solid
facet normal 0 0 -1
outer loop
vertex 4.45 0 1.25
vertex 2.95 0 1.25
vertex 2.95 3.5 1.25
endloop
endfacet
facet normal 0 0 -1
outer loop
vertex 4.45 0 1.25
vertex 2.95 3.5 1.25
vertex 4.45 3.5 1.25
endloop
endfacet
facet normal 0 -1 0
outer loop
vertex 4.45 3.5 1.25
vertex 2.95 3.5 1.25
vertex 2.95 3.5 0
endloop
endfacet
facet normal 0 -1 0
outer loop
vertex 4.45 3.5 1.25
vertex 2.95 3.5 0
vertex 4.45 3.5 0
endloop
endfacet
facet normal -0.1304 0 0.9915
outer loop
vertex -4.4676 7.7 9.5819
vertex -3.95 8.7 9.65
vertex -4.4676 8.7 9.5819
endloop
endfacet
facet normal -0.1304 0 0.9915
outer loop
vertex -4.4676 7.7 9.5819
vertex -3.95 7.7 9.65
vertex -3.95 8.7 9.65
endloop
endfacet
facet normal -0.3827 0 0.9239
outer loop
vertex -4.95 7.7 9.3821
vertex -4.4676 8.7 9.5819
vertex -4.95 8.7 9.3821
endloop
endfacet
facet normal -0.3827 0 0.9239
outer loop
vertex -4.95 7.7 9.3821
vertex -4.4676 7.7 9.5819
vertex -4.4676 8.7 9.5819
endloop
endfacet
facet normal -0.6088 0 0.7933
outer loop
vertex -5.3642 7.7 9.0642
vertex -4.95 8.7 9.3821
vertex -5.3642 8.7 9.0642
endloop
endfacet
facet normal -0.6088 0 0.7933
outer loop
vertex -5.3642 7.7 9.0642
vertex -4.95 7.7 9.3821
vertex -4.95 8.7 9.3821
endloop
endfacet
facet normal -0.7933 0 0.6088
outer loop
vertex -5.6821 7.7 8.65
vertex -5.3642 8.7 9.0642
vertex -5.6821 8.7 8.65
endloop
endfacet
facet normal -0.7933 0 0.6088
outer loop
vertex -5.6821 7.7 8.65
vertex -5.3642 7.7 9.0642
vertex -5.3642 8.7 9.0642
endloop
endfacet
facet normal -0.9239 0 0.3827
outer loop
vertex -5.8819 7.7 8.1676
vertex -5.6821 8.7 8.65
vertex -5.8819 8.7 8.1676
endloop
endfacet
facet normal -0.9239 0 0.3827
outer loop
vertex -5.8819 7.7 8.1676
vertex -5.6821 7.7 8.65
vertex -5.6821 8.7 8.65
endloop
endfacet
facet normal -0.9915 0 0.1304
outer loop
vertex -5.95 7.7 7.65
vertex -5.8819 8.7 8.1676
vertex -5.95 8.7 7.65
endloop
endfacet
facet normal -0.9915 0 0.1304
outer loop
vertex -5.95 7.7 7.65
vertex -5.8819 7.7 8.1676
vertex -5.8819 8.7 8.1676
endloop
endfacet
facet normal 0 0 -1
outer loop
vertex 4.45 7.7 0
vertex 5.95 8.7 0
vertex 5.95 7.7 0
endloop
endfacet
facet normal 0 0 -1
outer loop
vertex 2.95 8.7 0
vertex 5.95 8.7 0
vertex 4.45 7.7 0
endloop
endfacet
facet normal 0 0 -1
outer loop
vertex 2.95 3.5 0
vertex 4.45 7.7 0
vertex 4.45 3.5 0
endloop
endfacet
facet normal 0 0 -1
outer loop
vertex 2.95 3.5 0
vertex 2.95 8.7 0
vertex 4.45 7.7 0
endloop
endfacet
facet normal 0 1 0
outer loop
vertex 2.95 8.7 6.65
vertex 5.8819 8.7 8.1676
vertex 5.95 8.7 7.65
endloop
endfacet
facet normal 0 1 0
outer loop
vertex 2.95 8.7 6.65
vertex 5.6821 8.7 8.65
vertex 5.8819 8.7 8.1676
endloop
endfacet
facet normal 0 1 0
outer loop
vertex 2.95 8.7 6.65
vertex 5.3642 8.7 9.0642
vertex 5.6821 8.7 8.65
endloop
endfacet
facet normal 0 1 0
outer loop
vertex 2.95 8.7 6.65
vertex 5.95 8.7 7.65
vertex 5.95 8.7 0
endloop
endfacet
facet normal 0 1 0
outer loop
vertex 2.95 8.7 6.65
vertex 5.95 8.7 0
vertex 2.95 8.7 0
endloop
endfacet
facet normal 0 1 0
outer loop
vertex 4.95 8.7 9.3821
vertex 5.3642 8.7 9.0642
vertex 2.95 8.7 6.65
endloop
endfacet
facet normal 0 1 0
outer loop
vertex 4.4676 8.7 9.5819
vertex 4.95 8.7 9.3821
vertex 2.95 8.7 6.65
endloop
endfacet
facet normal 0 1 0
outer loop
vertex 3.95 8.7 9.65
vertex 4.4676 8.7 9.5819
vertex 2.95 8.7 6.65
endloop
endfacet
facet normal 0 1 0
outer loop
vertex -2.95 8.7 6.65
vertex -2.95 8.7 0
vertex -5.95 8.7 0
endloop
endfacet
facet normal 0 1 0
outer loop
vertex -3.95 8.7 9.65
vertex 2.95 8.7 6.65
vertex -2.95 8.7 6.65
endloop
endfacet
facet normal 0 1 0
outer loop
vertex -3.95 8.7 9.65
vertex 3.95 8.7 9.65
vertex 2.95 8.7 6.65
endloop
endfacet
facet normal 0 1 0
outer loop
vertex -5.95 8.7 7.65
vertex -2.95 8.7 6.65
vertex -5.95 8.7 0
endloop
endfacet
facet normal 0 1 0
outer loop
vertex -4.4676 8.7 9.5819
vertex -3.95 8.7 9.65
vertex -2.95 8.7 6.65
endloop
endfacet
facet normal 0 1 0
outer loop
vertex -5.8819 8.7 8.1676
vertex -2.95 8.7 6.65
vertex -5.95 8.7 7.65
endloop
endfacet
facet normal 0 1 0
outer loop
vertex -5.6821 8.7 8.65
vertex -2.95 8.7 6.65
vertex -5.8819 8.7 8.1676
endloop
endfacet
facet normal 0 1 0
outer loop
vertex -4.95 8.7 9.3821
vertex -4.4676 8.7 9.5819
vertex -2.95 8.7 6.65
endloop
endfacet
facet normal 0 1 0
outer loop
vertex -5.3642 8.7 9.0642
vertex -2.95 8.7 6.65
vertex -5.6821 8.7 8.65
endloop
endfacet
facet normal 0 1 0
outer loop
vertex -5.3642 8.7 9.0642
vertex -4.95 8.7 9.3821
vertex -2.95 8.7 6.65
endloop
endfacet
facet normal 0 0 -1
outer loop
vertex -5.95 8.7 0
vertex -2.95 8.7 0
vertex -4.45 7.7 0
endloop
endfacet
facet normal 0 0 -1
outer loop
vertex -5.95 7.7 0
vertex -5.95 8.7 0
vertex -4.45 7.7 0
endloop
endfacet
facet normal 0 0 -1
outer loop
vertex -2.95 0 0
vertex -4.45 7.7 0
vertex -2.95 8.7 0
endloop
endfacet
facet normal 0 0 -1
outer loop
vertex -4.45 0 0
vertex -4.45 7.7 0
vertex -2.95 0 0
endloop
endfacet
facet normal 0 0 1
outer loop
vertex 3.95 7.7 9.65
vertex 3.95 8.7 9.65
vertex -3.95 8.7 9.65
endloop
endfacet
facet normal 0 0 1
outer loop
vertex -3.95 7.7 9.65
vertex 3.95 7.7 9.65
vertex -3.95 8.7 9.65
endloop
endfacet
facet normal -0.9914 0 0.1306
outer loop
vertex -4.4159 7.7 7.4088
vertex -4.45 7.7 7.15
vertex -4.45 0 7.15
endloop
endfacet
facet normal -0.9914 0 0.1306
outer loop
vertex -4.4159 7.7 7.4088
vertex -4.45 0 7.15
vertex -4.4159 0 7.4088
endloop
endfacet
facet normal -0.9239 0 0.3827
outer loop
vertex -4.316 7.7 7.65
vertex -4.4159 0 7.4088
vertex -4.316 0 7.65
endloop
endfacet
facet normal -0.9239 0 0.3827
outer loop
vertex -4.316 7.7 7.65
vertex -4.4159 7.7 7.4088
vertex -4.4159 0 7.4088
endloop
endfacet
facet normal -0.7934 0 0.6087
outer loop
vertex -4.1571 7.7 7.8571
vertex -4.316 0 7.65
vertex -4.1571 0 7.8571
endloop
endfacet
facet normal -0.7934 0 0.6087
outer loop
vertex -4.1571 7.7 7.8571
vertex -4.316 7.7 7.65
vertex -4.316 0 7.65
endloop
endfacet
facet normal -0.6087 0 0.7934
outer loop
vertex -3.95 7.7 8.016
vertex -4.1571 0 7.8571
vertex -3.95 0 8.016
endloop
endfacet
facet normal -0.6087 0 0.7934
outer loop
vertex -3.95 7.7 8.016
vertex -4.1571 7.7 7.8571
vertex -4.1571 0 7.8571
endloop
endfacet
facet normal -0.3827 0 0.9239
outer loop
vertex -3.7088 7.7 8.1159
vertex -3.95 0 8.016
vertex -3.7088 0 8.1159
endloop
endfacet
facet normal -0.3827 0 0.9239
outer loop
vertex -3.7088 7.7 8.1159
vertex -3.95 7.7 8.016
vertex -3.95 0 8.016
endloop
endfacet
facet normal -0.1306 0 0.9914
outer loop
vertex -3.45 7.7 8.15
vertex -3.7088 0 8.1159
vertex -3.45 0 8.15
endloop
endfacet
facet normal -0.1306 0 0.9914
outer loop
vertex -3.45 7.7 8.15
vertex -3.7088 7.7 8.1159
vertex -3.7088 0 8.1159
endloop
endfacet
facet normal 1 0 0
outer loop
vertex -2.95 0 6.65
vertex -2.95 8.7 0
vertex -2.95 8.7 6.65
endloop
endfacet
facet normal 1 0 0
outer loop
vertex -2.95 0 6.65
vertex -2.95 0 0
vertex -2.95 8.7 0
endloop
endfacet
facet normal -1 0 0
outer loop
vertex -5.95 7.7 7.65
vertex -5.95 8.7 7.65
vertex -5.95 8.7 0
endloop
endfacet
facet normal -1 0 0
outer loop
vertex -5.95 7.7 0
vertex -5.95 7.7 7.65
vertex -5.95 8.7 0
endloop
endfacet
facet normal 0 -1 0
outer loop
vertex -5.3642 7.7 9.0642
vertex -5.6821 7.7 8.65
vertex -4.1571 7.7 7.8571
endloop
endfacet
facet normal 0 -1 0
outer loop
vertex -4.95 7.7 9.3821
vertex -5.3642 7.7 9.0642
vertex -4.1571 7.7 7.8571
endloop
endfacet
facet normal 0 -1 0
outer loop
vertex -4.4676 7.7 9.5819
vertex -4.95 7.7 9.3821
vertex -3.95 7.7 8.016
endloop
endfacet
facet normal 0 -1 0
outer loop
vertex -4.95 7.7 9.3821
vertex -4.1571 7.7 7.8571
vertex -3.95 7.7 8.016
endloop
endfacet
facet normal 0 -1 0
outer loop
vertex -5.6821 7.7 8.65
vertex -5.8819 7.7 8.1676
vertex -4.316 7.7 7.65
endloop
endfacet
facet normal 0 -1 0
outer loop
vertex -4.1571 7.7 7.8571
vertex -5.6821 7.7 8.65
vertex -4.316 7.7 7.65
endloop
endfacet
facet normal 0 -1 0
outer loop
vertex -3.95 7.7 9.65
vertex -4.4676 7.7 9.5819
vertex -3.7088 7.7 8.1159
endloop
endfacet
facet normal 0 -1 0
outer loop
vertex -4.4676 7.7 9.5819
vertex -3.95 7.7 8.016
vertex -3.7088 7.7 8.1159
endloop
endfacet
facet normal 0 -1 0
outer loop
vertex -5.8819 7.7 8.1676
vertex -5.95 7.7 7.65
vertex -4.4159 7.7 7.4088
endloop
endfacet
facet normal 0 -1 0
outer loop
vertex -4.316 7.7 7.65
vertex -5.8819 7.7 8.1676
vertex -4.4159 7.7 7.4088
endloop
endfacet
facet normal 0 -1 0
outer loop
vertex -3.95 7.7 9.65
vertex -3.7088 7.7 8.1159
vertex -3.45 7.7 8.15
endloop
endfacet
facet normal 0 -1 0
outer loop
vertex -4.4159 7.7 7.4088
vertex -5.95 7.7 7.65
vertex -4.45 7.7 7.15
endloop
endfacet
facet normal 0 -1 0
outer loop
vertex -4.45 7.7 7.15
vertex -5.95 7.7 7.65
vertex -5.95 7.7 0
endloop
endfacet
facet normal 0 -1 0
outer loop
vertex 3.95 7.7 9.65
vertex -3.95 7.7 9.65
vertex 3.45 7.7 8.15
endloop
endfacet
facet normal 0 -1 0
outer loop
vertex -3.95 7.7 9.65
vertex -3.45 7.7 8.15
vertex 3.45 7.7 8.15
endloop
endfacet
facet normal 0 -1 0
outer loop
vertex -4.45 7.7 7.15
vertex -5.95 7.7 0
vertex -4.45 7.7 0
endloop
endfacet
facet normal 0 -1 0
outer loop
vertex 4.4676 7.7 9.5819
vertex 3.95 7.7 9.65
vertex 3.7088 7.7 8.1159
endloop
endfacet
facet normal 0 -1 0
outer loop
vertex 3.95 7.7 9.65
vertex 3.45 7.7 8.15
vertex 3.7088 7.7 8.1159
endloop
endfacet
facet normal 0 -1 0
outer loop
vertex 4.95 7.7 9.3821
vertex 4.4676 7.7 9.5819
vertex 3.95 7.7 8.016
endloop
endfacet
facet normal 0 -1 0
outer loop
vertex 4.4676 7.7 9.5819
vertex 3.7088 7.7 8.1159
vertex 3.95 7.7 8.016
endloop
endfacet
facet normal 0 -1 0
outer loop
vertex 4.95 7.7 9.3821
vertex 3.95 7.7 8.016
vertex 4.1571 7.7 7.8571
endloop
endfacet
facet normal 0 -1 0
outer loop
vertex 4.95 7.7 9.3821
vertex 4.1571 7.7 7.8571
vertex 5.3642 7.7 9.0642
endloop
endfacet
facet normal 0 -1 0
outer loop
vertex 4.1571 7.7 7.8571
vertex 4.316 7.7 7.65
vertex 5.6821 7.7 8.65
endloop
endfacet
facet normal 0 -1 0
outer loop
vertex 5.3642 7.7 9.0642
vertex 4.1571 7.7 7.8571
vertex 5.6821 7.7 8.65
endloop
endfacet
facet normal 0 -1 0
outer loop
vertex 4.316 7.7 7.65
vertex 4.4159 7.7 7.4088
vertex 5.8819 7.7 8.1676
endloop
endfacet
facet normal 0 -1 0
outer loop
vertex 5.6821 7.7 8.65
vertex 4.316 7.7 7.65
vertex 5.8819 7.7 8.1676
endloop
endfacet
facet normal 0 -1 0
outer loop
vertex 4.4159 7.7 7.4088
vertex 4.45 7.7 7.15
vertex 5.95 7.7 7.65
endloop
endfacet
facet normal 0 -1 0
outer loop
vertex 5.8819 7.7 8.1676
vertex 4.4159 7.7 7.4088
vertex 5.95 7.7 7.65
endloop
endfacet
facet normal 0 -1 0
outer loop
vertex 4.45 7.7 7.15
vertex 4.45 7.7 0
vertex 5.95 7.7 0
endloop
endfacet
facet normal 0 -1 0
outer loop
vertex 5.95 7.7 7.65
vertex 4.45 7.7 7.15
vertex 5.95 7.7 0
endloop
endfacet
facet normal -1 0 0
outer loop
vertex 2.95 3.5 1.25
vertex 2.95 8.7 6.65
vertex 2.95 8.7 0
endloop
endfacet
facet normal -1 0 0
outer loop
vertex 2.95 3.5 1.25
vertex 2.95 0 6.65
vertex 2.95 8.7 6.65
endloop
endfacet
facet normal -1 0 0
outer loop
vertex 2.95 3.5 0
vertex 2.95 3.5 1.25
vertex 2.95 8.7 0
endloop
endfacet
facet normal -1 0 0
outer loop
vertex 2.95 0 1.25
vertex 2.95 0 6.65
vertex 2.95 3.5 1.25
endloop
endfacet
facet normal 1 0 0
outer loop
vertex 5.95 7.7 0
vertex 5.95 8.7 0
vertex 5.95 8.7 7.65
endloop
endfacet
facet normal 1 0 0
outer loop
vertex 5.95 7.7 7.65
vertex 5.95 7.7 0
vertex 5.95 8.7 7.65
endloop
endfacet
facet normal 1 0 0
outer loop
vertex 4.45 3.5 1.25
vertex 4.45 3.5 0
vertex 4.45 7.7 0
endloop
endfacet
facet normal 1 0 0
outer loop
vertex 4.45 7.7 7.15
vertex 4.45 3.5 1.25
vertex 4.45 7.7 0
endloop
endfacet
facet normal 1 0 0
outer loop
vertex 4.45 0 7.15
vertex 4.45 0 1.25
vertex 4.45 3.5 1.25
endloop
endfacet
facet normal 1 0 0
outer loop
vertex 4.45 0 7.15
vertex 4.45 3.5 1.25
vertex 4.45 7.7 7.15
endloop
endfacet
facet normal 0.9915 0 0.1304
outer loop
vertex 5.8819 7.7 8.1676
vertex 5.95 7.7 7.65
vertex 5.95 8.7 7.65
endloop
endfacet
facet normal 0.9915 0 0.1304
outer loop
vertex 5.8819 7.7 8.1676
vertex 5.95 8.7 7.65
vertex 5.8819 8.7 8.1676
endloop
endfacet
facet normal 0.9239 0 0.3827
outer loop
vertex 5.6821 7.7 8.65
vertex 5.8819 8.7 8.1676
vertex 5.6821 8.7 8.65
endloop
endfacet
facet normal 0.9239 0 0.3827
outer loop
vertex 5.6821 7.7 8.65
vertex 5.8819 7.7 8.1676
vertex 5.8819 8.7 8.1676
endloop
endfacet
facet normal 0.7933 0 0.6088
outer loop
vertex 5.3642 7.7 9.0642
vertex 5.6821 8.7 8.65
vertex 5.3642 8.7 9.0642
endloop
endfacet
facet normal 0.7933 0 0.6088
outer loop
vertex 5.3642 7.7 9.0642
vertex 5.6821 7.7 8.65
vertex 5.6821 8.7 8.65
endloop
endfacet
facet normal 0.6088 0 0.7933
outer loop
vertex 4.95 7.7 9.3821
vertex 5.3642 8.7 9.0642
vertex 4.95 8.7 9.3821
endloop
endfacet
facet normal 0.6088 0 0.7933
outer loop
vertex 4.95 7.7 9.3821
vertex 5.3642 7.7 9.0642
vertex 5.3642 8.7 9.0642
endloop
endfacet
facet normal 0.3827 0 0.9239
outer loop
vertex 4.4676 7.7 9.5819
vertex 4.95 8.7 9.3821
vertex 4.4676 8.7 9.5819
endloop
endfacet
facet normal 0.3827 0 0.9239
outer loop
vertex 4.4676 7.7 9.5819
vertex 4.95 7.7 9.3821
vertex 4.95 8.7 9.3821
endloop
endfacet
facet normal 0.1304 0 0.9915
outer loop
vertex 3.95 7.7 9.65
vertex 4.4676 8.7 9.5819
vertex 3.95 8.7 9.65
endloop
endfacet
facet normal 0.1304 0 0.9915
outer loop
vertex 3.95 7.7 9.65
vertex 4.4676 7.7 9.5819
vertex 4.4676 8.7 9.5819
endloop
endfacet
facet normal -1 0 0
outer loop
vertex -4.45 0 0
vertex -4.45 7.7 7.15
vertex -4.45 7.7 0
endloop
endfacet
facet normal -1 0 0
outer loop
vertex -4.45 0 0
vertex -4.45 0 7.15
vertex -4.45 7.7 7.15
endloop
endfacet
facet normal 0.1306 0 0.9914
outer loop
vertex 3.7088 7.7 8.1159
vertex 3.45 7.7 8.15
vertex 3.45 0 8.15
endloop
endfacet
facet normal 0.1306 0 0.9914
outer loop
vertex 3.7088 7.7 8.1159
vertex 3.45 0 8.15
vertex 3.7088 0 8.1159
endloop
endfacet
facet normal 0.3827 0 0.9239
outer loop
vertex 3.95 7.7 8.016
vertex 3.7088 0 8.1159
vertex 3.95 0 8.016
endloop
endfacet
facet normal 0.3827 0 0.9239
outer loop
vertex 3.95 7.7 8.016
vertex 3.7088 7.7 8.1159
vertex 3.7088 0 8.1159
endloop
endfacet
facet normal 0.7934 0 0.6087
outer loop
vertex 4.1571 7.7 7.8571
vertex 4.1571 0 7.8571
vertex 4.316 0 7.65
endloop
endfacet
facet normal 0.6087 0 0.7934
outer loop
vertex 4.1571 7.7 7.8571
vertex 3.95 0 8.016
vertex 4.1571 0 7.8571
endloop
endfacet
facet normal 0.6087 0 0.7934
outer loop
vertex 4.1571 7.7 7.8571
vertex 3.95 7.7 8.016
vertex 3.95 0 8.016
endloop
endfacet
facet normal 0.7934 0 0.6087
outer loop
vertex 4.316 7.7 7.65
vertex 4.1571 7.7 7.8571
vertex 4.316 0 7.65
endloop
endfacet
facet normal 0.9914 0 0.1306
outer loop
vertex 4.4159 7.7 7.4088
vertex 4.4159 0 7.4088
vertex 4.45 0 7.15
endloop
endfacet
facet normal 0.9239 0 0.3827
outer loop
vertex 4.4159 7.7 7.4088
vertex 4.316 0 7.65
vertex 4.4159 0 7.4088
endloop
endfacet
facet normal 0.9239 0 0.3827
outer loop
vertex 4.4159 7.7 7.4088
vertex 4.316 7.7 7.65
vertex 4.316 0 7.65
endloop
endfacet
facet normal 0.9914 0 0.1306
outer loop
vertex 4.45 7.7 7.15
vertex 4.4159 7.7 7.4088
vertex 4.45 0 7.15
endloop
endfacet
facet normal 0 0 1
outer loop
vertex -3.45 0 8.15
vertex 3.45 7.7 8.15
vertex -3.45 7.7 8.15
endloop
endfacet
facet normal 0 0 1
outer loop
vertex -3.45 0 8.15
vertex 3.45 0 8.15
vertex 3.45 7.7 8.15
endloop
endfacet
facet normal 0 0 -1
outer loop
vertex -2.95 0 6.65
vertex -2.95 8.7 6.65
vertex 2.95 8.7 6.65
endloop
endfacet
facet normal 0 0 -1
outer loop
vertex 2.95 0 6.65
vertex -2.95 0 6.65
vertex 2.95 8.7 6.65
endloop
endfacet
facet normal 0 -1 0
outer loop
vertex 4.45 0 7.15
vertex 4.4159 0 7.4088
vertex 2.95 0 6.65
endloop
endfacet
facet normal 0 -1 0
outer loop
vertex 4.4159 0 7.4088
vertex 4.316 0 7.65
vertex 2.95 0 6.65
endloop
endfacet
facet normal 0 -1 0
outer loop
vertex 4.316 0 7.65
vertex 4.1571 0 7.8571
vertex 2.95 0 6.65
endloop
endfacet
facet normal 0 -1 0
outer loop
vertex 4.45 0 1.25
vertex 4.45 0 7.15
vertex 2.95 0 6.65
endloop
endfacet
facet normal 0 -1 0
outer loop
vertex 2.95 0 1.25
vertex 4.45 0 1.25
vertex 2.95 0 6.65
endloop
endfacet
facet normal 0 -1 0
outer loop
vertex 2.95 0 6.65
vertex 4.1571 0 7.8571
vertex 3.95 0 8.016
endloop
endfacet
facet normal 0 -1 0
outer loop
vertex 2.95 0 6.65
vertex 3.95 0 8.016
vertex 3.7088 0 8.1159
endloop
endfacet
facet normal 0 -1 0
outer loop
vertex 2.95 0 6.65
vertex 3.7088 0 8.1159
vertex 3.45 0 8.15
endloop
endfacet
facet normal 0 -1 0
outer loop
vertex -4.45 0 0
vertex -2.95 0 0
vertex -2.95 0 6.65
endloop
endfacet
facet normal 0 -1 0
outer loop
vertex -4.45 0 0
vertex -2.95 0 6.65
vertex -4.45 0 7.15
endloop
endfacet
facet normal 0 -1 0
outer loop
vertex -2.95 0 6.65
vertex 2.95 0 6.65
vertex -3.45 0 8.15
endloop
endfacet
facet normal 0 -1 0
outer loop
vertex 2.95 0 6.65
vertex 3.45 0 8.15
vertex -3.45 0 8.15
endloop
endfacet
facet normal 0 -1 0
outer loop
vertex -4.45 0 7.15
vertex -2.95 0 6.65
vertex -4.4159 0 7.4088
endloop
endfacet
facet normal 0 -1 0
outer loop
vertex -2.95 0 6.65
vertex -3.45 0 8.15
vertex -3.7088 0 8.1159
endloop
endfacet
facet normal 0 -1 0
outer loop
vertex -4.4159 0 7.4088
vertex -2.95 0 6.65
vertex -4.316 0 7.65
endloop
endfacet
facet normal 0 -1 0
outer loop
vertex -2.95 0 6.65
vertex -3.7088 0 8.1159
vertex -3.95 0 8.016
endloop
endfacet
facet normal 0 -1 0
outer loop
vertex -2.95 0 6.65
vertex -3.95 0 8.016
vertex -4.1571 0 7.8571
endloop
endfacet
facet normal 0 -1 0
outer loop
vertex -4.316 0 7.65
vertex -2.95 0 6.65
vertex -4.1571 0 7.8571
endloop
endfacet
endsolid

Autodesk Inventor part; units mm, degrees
ref_plane "YZ Plane" through (0, 0, 0) normal (1, 0, 0) x (0, 1, 0)
ref_plane "XZ Plane" through (0, 0, 0) normal (0, 1, 0) x (-1, 0, 0)
ref_plane "XY Plane" through (0, 0, 0) normal (0, 0, 1) x (1, 0, 0)
sketch "Boceto1" plane through (0, 0, 0) normal (0, 1, 0) x (-1, 0, 0)
  line L0 (-2.95, -6.65) -> (2.95, -6.65)
  line L1 (2.95, -6.65) -> (2.95, 6.65)
  line L2 (2.95, 6.65) -> (-2.95, 6.65)
  line L3 (-2.95, 6.65) -> (-2.95, -6.65)
  line L4 (-2.95, -6.65) -> (2.95, 6.65) construction
  line L5 (2.95, -6.65) -> (-2.95, 6.65) construction
  line L6 (4.45, 8.15) -> (4.45, -8.15)
  line L7 (4.45, -8.15) -> (-4.45, -8.15)
  line L8 (-4.45, -8.15) -> (-4.45, 8.15)
  line L9 (-4.45, 8.15) -> (4.45, 8.15)
  point P0 (0, 0)
  dimension "d0" = 5.9
  dimension "d1" = 13.3
  dimension "d2" = 1.5
extrude "Extrusión1" add sketch "Boceto1" along normal blind 8.7
sketch "Boceto2" plane through (0, 8.7, 0) normal (0, 1, 0) x (1, 0, 0)
  line L0 (4.45, -8.15) -> (4.45, 8.15) projected
  line L1 (4.45, 8.15) -> (-4.45, 8.15) projected
  line L2 (-4.45, 8.15) -> (-4.45, -8.15) projected
  line L3 (-4.45, -8.15) -> (4.45, -8.15) projected
  line L4 (2.95, 6.65) -> (2.95, -6.65) projected
  line L5 (2.95, -6.65) -> (-2.95, -6.65) projected
  line L6 (-2.95, -6.65) -> (-2.95, 6.65) projected
  line L7 (-2.95, 6.65) -> (2.95, 6.65) projected
  line L8 (-5.95, -9.65) -> (-5.95, 9.65)
  line L9 (-5.95, 9.65) -> (5.95, 9.65)
  line L10 (5.95, 9.65) -> (5.95, -9.65)
  line L11 (5.95, -9.65) -> (-5.95, -9.65)
  point P0 (0, 0)
  dimension "d5" = 1.5
extrude "Extrusión2" add sketch "Boceto2" against normal blind 1 contours L8 L9 L10 L11
fillet "Empalme1" radius 2 4 edges at (5.95, 8.2, 9.65) (-5.95, 8.2, 9.65) (5.95, 8.2, -9.65) (-5.95, 8.2, -9.65)
fillet "Empalme2" radius 1 4 edges at (4.45, 3.85, 8.15) (-4.45, 3.85, 8.15) (4.45, 3.85, -8.15) (-4.45, 3.85, -8.15)
sketch "Boceto3" plane through (0, 0, 0) normal (0, -1, 0) x (1, 0, 0)
  line L0 (0, 0) -> (0, -1.25)
  line L1 (0, -1.25) -> (4.45, -1.25)
  line L2 (4.45, 7.15) -> (4.45, -7.15) projected
  line L3 (0, 0) -> (0, 1.25)
  line L4 (0, 1.25) -> (4.45, 1.25)
  dimension "d10" = 1.25
  dimension "d11" = 1.25
extrude "Extrusión3" cut sketch "Boceto3" against normal blind 3.5
split "Dividir1" plane through (0, 0, 0) removes the side toward (0, 0, -1)
properties part number "PIeza Conector USB"
